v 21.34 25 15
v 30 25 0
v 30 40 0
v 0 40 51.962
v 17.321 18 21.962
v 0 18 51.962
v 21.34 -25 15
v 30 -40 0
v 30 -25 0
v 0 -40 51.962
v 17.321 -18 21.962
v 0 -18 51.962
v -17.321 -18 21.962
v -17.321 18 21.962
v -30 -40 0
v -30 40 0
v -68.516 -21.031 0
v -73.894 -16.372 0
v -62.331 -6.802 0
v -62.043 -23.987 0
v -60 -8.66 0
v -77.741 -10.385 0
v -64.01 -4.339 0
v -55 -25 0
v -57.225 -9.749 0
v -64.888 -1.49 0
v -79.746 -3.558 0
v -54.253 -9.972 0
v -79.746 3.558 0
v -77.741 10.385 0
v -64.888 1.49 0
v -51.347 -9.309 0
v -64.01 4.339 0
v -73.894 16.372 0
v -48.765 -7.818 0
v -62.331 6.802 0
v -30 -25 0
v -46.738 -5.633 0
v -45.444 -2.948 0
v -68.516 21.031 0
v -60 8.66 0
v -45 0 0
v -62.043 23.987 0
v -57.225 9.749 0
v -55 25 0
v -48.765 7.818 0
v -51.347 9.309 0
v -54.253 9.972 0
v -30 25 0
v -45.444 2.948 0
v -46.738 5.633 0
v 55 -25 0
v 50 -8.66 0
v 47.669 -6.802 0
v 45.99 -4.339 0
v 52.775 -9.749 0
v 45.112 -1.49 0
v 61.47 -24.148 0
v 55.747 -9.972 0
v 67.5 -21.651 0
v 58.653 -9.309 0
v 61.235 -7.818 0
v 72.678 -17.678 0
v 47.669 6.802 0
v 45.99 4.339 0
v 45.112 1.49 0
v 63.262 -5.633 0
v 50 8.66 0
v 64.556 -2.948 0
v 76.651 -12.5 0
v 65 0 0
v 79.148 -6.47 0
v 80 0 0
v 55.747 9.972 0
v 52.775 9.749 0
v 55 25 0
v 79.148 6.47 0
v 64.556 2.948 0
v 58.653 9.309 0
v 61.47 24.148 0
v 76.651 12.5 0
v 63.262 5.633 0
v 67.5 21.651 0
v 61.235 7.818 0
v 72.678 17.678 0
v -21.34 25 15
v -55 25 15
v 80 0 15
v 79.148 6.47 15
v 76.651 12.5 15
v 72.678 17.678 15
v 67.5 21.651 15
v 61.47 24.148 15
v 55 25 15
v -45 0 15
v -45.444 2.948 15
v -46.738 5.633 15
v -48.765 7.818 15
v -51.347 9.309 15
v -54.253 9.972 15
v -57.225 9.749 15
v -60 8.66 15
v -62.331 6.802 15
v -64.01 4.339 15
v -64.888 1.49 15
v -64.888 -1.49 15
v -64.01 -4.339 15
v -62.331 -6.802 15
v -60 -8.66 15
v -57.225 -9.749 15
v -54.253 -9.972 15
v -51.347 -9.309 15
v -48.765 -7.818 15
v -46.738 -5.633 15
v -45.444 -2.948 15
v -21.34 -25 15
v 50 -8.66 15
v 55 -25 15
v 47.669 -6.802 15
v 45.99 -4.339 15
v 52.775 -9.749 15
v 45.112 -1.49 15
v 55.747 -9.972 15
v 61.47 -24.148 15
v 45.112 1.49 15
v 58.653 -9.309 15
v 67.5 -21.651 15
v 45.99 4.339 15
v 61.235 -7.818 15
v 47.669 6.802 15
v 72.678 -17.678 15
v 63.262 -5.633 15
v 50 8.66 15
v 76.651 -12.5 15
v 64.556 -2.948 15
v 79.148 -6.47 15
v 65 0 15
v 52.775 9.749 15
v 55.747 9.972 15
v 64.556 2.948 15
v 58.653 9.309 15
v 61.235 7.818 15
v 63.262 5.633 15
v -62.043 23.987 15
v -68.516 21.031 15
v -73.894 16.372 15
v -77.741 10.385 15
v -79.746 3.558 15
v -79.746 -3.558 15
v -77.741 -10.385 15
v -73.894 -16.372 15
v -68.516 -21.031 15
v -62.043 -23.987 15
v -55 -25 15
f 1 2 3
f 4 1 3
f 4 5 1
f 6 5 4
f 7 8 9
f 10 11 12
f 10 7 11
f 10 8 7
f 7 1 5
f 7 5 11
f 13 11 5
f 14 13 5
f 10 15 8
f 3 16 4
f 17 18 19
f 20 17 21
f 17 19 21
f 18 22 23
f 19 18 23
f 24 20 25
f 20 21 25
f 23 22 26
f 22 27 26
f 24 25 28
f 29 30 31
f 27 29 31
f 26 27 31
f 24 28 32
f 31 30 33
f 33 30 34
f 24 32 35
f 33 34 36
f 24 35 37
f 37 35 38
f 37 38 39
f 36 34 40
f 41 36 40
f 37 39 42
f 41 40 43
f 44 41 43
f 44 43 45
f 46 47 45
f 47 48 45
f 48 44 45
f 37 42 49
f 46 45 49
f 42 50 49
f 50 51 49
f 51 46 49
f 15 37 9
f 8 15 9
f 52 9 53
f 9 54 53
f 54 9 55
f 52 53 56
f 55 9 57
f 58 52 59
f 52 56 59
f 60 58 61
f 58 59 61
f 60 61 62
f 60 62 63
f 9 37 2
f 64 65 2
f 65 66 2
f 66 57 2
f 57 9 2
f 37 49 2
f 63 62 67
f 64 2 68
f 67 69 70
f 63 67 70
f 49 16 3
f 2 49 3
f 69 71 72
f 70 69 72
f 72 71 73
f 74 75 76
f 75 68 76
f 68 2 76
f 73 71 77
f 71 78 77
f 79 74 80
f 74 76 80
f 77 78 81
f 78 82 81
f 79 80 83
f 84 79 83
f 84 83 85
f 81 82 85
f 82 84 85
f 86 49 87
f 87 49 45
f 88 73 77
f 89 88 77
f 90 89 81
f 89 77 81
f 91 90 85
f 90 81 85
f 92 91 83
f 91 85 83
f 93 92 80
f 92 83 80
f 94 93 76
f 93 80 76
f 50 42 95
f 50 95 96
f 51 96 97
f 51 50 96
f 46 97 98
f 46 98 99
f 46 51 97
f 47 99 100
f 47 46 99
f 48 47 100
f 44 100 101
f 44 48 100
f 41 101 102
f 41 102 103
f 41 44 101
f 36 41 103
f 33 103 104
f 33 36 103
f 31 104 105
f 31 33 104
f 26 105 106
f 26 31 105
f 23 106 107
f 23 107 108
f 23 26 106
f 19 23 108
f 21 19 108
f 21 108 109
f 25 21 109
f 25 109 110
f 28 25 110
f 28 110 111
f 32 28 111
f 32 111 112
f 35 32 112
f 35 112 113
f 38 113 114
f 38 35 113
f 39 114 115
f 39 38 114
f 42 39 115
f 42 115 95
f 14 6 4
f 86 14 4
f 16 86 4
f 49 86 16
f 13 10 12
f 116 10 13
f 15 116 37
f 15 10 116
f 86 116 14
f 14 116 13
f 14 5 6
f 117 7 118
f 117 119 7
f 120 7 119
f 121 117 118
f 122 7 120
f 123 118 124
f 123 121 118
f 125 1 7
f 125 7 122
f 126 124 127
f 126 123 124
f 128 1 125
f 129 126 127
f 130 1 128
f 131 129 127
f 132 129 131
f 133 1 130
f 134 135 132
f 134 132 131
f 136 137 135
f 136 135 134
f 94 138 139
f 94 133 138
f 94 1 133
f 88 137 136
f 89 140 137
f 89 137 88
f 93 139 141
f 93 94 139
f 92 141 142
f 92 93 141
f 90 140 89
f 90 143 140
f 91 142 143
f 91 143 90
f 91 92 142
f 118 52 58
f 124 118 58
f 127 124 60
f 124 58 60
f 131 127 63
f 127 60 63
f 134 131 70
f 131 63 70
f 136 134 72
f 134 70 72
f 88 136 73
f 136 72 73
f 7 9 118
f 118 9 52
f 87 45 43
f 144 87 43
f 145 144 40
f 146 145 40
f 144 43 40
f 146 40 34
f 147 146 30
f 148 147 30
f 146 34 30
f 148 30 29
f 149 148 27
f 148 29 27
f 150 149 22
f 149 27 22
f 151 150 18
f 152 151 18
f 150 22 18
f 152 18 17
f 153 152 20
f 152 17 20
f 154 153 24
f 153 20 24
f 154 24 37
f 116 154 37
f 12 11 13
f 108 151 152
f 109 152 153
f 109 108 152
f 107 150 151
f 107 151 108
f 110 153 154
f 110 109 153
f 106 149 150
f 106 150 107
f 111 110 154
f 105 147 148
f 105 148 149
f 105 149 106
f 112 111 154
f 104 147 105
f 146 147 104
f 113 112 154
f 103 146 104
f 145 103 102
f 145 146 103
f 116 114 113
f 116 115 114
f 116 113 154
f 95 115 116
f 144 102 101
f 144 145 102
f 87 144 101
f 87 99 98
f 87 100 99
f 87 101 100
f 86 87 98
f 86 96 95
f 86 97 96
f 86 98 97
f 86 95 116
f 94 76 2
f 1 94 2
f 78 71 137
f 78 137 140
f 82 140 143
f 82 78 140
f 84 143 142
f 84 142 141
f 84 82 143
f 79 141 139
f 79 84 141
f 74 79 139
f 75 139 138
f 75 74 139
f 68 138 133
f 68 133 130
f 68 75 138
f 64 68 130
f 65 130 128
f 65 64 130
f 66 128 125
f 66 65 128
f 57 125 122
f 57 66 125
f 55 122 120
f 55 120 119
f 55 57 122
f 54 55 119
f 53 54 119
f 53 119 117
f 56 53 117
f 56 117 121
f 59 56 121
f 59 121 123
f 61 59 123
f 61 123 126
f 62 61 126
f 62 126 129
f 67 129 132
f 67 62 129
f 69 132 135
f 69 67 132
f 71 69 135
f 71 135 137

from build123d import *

# Parameters (mm, degrees)
F2_DEPTH = 40
F0_R     = 10
F3_DEPTH = 15
F4_W     = 36
F4_H     = 30
F5_DEPTH = 30


with BuildPart() as f2:
    # F1 (on Front) → F2 (new body, symmetric)
    with BuildSketch(Plane.XZ):
        Polygon((-30, 0), (30, 0), (0, 51.9615242271), align=None)
    extrude(amount=F2_DEPTH, both=True)

    # F0 (on Top) → F3 (join)
    with BuildSketch(Plane.XY):
        with BuildLine():
            ThreePointArc((55, -25), (72.6776695297, -17.6776695297), (80, 0))
            ThreePointArc((80, 0), (72.6776695297, 17.6776695297), (55, 25))
            ThreePointArc((55, 25), (30, 0), (55, -25))
        make_face()
        with Locations((55, 0)):
            Circle(F0_R, mode=Mode.SUBTRACT)
        with BuildLine():
            ThreePointArc((55, -25), (30, 0), (55, 25))
            Line((55, 25), (30, 25))
            Line((30, 25), (0, 25))
            Line((0, 25), (-30, 25))
            Line((-30, 25), (-55, 25))
            ThreePointArc((-55, 25), (-37.3223304703, 17.6776695297), (-30, 0))
            ThreePointArc((-30, 0), (-37.3223304703, -17.6776695297), (-55, -25))
            Line((-55, -25), (-30, -25))
            Line((-30, -25), (0, -25))
            Line((0, -25), (30, -25))
            Line((30, -25), (55, -25))
        make_face()
        with BuildLine():
            ThreePointArc((-30, 0), (-37.3223304703, 17.6776695297), (-55, 25))
            ThreePointArc((-55, 25), (-80, 0), (-55, -25))
            ThreePointArc((-55, -25), (-37.3223304703, -17.6776695297), (-30, 0))
        make_face()
        with Locations((-55, 0)):
            Circle(F0_R, mode=Mode.SUBTRACT)
    extrude(amount=F3_DEPTH)

    # F4 (on Right) → F5 (cut, symmetric)
    with BuildSketch(Plane.YZ):
        with Locations((0, 36.9615242271)):
            Rectangle(F4_W, F4_H)
    extrude(amount=F5_DEPTH, both=True, mode=Mode.SUBTRACT)


solid = f2.part
